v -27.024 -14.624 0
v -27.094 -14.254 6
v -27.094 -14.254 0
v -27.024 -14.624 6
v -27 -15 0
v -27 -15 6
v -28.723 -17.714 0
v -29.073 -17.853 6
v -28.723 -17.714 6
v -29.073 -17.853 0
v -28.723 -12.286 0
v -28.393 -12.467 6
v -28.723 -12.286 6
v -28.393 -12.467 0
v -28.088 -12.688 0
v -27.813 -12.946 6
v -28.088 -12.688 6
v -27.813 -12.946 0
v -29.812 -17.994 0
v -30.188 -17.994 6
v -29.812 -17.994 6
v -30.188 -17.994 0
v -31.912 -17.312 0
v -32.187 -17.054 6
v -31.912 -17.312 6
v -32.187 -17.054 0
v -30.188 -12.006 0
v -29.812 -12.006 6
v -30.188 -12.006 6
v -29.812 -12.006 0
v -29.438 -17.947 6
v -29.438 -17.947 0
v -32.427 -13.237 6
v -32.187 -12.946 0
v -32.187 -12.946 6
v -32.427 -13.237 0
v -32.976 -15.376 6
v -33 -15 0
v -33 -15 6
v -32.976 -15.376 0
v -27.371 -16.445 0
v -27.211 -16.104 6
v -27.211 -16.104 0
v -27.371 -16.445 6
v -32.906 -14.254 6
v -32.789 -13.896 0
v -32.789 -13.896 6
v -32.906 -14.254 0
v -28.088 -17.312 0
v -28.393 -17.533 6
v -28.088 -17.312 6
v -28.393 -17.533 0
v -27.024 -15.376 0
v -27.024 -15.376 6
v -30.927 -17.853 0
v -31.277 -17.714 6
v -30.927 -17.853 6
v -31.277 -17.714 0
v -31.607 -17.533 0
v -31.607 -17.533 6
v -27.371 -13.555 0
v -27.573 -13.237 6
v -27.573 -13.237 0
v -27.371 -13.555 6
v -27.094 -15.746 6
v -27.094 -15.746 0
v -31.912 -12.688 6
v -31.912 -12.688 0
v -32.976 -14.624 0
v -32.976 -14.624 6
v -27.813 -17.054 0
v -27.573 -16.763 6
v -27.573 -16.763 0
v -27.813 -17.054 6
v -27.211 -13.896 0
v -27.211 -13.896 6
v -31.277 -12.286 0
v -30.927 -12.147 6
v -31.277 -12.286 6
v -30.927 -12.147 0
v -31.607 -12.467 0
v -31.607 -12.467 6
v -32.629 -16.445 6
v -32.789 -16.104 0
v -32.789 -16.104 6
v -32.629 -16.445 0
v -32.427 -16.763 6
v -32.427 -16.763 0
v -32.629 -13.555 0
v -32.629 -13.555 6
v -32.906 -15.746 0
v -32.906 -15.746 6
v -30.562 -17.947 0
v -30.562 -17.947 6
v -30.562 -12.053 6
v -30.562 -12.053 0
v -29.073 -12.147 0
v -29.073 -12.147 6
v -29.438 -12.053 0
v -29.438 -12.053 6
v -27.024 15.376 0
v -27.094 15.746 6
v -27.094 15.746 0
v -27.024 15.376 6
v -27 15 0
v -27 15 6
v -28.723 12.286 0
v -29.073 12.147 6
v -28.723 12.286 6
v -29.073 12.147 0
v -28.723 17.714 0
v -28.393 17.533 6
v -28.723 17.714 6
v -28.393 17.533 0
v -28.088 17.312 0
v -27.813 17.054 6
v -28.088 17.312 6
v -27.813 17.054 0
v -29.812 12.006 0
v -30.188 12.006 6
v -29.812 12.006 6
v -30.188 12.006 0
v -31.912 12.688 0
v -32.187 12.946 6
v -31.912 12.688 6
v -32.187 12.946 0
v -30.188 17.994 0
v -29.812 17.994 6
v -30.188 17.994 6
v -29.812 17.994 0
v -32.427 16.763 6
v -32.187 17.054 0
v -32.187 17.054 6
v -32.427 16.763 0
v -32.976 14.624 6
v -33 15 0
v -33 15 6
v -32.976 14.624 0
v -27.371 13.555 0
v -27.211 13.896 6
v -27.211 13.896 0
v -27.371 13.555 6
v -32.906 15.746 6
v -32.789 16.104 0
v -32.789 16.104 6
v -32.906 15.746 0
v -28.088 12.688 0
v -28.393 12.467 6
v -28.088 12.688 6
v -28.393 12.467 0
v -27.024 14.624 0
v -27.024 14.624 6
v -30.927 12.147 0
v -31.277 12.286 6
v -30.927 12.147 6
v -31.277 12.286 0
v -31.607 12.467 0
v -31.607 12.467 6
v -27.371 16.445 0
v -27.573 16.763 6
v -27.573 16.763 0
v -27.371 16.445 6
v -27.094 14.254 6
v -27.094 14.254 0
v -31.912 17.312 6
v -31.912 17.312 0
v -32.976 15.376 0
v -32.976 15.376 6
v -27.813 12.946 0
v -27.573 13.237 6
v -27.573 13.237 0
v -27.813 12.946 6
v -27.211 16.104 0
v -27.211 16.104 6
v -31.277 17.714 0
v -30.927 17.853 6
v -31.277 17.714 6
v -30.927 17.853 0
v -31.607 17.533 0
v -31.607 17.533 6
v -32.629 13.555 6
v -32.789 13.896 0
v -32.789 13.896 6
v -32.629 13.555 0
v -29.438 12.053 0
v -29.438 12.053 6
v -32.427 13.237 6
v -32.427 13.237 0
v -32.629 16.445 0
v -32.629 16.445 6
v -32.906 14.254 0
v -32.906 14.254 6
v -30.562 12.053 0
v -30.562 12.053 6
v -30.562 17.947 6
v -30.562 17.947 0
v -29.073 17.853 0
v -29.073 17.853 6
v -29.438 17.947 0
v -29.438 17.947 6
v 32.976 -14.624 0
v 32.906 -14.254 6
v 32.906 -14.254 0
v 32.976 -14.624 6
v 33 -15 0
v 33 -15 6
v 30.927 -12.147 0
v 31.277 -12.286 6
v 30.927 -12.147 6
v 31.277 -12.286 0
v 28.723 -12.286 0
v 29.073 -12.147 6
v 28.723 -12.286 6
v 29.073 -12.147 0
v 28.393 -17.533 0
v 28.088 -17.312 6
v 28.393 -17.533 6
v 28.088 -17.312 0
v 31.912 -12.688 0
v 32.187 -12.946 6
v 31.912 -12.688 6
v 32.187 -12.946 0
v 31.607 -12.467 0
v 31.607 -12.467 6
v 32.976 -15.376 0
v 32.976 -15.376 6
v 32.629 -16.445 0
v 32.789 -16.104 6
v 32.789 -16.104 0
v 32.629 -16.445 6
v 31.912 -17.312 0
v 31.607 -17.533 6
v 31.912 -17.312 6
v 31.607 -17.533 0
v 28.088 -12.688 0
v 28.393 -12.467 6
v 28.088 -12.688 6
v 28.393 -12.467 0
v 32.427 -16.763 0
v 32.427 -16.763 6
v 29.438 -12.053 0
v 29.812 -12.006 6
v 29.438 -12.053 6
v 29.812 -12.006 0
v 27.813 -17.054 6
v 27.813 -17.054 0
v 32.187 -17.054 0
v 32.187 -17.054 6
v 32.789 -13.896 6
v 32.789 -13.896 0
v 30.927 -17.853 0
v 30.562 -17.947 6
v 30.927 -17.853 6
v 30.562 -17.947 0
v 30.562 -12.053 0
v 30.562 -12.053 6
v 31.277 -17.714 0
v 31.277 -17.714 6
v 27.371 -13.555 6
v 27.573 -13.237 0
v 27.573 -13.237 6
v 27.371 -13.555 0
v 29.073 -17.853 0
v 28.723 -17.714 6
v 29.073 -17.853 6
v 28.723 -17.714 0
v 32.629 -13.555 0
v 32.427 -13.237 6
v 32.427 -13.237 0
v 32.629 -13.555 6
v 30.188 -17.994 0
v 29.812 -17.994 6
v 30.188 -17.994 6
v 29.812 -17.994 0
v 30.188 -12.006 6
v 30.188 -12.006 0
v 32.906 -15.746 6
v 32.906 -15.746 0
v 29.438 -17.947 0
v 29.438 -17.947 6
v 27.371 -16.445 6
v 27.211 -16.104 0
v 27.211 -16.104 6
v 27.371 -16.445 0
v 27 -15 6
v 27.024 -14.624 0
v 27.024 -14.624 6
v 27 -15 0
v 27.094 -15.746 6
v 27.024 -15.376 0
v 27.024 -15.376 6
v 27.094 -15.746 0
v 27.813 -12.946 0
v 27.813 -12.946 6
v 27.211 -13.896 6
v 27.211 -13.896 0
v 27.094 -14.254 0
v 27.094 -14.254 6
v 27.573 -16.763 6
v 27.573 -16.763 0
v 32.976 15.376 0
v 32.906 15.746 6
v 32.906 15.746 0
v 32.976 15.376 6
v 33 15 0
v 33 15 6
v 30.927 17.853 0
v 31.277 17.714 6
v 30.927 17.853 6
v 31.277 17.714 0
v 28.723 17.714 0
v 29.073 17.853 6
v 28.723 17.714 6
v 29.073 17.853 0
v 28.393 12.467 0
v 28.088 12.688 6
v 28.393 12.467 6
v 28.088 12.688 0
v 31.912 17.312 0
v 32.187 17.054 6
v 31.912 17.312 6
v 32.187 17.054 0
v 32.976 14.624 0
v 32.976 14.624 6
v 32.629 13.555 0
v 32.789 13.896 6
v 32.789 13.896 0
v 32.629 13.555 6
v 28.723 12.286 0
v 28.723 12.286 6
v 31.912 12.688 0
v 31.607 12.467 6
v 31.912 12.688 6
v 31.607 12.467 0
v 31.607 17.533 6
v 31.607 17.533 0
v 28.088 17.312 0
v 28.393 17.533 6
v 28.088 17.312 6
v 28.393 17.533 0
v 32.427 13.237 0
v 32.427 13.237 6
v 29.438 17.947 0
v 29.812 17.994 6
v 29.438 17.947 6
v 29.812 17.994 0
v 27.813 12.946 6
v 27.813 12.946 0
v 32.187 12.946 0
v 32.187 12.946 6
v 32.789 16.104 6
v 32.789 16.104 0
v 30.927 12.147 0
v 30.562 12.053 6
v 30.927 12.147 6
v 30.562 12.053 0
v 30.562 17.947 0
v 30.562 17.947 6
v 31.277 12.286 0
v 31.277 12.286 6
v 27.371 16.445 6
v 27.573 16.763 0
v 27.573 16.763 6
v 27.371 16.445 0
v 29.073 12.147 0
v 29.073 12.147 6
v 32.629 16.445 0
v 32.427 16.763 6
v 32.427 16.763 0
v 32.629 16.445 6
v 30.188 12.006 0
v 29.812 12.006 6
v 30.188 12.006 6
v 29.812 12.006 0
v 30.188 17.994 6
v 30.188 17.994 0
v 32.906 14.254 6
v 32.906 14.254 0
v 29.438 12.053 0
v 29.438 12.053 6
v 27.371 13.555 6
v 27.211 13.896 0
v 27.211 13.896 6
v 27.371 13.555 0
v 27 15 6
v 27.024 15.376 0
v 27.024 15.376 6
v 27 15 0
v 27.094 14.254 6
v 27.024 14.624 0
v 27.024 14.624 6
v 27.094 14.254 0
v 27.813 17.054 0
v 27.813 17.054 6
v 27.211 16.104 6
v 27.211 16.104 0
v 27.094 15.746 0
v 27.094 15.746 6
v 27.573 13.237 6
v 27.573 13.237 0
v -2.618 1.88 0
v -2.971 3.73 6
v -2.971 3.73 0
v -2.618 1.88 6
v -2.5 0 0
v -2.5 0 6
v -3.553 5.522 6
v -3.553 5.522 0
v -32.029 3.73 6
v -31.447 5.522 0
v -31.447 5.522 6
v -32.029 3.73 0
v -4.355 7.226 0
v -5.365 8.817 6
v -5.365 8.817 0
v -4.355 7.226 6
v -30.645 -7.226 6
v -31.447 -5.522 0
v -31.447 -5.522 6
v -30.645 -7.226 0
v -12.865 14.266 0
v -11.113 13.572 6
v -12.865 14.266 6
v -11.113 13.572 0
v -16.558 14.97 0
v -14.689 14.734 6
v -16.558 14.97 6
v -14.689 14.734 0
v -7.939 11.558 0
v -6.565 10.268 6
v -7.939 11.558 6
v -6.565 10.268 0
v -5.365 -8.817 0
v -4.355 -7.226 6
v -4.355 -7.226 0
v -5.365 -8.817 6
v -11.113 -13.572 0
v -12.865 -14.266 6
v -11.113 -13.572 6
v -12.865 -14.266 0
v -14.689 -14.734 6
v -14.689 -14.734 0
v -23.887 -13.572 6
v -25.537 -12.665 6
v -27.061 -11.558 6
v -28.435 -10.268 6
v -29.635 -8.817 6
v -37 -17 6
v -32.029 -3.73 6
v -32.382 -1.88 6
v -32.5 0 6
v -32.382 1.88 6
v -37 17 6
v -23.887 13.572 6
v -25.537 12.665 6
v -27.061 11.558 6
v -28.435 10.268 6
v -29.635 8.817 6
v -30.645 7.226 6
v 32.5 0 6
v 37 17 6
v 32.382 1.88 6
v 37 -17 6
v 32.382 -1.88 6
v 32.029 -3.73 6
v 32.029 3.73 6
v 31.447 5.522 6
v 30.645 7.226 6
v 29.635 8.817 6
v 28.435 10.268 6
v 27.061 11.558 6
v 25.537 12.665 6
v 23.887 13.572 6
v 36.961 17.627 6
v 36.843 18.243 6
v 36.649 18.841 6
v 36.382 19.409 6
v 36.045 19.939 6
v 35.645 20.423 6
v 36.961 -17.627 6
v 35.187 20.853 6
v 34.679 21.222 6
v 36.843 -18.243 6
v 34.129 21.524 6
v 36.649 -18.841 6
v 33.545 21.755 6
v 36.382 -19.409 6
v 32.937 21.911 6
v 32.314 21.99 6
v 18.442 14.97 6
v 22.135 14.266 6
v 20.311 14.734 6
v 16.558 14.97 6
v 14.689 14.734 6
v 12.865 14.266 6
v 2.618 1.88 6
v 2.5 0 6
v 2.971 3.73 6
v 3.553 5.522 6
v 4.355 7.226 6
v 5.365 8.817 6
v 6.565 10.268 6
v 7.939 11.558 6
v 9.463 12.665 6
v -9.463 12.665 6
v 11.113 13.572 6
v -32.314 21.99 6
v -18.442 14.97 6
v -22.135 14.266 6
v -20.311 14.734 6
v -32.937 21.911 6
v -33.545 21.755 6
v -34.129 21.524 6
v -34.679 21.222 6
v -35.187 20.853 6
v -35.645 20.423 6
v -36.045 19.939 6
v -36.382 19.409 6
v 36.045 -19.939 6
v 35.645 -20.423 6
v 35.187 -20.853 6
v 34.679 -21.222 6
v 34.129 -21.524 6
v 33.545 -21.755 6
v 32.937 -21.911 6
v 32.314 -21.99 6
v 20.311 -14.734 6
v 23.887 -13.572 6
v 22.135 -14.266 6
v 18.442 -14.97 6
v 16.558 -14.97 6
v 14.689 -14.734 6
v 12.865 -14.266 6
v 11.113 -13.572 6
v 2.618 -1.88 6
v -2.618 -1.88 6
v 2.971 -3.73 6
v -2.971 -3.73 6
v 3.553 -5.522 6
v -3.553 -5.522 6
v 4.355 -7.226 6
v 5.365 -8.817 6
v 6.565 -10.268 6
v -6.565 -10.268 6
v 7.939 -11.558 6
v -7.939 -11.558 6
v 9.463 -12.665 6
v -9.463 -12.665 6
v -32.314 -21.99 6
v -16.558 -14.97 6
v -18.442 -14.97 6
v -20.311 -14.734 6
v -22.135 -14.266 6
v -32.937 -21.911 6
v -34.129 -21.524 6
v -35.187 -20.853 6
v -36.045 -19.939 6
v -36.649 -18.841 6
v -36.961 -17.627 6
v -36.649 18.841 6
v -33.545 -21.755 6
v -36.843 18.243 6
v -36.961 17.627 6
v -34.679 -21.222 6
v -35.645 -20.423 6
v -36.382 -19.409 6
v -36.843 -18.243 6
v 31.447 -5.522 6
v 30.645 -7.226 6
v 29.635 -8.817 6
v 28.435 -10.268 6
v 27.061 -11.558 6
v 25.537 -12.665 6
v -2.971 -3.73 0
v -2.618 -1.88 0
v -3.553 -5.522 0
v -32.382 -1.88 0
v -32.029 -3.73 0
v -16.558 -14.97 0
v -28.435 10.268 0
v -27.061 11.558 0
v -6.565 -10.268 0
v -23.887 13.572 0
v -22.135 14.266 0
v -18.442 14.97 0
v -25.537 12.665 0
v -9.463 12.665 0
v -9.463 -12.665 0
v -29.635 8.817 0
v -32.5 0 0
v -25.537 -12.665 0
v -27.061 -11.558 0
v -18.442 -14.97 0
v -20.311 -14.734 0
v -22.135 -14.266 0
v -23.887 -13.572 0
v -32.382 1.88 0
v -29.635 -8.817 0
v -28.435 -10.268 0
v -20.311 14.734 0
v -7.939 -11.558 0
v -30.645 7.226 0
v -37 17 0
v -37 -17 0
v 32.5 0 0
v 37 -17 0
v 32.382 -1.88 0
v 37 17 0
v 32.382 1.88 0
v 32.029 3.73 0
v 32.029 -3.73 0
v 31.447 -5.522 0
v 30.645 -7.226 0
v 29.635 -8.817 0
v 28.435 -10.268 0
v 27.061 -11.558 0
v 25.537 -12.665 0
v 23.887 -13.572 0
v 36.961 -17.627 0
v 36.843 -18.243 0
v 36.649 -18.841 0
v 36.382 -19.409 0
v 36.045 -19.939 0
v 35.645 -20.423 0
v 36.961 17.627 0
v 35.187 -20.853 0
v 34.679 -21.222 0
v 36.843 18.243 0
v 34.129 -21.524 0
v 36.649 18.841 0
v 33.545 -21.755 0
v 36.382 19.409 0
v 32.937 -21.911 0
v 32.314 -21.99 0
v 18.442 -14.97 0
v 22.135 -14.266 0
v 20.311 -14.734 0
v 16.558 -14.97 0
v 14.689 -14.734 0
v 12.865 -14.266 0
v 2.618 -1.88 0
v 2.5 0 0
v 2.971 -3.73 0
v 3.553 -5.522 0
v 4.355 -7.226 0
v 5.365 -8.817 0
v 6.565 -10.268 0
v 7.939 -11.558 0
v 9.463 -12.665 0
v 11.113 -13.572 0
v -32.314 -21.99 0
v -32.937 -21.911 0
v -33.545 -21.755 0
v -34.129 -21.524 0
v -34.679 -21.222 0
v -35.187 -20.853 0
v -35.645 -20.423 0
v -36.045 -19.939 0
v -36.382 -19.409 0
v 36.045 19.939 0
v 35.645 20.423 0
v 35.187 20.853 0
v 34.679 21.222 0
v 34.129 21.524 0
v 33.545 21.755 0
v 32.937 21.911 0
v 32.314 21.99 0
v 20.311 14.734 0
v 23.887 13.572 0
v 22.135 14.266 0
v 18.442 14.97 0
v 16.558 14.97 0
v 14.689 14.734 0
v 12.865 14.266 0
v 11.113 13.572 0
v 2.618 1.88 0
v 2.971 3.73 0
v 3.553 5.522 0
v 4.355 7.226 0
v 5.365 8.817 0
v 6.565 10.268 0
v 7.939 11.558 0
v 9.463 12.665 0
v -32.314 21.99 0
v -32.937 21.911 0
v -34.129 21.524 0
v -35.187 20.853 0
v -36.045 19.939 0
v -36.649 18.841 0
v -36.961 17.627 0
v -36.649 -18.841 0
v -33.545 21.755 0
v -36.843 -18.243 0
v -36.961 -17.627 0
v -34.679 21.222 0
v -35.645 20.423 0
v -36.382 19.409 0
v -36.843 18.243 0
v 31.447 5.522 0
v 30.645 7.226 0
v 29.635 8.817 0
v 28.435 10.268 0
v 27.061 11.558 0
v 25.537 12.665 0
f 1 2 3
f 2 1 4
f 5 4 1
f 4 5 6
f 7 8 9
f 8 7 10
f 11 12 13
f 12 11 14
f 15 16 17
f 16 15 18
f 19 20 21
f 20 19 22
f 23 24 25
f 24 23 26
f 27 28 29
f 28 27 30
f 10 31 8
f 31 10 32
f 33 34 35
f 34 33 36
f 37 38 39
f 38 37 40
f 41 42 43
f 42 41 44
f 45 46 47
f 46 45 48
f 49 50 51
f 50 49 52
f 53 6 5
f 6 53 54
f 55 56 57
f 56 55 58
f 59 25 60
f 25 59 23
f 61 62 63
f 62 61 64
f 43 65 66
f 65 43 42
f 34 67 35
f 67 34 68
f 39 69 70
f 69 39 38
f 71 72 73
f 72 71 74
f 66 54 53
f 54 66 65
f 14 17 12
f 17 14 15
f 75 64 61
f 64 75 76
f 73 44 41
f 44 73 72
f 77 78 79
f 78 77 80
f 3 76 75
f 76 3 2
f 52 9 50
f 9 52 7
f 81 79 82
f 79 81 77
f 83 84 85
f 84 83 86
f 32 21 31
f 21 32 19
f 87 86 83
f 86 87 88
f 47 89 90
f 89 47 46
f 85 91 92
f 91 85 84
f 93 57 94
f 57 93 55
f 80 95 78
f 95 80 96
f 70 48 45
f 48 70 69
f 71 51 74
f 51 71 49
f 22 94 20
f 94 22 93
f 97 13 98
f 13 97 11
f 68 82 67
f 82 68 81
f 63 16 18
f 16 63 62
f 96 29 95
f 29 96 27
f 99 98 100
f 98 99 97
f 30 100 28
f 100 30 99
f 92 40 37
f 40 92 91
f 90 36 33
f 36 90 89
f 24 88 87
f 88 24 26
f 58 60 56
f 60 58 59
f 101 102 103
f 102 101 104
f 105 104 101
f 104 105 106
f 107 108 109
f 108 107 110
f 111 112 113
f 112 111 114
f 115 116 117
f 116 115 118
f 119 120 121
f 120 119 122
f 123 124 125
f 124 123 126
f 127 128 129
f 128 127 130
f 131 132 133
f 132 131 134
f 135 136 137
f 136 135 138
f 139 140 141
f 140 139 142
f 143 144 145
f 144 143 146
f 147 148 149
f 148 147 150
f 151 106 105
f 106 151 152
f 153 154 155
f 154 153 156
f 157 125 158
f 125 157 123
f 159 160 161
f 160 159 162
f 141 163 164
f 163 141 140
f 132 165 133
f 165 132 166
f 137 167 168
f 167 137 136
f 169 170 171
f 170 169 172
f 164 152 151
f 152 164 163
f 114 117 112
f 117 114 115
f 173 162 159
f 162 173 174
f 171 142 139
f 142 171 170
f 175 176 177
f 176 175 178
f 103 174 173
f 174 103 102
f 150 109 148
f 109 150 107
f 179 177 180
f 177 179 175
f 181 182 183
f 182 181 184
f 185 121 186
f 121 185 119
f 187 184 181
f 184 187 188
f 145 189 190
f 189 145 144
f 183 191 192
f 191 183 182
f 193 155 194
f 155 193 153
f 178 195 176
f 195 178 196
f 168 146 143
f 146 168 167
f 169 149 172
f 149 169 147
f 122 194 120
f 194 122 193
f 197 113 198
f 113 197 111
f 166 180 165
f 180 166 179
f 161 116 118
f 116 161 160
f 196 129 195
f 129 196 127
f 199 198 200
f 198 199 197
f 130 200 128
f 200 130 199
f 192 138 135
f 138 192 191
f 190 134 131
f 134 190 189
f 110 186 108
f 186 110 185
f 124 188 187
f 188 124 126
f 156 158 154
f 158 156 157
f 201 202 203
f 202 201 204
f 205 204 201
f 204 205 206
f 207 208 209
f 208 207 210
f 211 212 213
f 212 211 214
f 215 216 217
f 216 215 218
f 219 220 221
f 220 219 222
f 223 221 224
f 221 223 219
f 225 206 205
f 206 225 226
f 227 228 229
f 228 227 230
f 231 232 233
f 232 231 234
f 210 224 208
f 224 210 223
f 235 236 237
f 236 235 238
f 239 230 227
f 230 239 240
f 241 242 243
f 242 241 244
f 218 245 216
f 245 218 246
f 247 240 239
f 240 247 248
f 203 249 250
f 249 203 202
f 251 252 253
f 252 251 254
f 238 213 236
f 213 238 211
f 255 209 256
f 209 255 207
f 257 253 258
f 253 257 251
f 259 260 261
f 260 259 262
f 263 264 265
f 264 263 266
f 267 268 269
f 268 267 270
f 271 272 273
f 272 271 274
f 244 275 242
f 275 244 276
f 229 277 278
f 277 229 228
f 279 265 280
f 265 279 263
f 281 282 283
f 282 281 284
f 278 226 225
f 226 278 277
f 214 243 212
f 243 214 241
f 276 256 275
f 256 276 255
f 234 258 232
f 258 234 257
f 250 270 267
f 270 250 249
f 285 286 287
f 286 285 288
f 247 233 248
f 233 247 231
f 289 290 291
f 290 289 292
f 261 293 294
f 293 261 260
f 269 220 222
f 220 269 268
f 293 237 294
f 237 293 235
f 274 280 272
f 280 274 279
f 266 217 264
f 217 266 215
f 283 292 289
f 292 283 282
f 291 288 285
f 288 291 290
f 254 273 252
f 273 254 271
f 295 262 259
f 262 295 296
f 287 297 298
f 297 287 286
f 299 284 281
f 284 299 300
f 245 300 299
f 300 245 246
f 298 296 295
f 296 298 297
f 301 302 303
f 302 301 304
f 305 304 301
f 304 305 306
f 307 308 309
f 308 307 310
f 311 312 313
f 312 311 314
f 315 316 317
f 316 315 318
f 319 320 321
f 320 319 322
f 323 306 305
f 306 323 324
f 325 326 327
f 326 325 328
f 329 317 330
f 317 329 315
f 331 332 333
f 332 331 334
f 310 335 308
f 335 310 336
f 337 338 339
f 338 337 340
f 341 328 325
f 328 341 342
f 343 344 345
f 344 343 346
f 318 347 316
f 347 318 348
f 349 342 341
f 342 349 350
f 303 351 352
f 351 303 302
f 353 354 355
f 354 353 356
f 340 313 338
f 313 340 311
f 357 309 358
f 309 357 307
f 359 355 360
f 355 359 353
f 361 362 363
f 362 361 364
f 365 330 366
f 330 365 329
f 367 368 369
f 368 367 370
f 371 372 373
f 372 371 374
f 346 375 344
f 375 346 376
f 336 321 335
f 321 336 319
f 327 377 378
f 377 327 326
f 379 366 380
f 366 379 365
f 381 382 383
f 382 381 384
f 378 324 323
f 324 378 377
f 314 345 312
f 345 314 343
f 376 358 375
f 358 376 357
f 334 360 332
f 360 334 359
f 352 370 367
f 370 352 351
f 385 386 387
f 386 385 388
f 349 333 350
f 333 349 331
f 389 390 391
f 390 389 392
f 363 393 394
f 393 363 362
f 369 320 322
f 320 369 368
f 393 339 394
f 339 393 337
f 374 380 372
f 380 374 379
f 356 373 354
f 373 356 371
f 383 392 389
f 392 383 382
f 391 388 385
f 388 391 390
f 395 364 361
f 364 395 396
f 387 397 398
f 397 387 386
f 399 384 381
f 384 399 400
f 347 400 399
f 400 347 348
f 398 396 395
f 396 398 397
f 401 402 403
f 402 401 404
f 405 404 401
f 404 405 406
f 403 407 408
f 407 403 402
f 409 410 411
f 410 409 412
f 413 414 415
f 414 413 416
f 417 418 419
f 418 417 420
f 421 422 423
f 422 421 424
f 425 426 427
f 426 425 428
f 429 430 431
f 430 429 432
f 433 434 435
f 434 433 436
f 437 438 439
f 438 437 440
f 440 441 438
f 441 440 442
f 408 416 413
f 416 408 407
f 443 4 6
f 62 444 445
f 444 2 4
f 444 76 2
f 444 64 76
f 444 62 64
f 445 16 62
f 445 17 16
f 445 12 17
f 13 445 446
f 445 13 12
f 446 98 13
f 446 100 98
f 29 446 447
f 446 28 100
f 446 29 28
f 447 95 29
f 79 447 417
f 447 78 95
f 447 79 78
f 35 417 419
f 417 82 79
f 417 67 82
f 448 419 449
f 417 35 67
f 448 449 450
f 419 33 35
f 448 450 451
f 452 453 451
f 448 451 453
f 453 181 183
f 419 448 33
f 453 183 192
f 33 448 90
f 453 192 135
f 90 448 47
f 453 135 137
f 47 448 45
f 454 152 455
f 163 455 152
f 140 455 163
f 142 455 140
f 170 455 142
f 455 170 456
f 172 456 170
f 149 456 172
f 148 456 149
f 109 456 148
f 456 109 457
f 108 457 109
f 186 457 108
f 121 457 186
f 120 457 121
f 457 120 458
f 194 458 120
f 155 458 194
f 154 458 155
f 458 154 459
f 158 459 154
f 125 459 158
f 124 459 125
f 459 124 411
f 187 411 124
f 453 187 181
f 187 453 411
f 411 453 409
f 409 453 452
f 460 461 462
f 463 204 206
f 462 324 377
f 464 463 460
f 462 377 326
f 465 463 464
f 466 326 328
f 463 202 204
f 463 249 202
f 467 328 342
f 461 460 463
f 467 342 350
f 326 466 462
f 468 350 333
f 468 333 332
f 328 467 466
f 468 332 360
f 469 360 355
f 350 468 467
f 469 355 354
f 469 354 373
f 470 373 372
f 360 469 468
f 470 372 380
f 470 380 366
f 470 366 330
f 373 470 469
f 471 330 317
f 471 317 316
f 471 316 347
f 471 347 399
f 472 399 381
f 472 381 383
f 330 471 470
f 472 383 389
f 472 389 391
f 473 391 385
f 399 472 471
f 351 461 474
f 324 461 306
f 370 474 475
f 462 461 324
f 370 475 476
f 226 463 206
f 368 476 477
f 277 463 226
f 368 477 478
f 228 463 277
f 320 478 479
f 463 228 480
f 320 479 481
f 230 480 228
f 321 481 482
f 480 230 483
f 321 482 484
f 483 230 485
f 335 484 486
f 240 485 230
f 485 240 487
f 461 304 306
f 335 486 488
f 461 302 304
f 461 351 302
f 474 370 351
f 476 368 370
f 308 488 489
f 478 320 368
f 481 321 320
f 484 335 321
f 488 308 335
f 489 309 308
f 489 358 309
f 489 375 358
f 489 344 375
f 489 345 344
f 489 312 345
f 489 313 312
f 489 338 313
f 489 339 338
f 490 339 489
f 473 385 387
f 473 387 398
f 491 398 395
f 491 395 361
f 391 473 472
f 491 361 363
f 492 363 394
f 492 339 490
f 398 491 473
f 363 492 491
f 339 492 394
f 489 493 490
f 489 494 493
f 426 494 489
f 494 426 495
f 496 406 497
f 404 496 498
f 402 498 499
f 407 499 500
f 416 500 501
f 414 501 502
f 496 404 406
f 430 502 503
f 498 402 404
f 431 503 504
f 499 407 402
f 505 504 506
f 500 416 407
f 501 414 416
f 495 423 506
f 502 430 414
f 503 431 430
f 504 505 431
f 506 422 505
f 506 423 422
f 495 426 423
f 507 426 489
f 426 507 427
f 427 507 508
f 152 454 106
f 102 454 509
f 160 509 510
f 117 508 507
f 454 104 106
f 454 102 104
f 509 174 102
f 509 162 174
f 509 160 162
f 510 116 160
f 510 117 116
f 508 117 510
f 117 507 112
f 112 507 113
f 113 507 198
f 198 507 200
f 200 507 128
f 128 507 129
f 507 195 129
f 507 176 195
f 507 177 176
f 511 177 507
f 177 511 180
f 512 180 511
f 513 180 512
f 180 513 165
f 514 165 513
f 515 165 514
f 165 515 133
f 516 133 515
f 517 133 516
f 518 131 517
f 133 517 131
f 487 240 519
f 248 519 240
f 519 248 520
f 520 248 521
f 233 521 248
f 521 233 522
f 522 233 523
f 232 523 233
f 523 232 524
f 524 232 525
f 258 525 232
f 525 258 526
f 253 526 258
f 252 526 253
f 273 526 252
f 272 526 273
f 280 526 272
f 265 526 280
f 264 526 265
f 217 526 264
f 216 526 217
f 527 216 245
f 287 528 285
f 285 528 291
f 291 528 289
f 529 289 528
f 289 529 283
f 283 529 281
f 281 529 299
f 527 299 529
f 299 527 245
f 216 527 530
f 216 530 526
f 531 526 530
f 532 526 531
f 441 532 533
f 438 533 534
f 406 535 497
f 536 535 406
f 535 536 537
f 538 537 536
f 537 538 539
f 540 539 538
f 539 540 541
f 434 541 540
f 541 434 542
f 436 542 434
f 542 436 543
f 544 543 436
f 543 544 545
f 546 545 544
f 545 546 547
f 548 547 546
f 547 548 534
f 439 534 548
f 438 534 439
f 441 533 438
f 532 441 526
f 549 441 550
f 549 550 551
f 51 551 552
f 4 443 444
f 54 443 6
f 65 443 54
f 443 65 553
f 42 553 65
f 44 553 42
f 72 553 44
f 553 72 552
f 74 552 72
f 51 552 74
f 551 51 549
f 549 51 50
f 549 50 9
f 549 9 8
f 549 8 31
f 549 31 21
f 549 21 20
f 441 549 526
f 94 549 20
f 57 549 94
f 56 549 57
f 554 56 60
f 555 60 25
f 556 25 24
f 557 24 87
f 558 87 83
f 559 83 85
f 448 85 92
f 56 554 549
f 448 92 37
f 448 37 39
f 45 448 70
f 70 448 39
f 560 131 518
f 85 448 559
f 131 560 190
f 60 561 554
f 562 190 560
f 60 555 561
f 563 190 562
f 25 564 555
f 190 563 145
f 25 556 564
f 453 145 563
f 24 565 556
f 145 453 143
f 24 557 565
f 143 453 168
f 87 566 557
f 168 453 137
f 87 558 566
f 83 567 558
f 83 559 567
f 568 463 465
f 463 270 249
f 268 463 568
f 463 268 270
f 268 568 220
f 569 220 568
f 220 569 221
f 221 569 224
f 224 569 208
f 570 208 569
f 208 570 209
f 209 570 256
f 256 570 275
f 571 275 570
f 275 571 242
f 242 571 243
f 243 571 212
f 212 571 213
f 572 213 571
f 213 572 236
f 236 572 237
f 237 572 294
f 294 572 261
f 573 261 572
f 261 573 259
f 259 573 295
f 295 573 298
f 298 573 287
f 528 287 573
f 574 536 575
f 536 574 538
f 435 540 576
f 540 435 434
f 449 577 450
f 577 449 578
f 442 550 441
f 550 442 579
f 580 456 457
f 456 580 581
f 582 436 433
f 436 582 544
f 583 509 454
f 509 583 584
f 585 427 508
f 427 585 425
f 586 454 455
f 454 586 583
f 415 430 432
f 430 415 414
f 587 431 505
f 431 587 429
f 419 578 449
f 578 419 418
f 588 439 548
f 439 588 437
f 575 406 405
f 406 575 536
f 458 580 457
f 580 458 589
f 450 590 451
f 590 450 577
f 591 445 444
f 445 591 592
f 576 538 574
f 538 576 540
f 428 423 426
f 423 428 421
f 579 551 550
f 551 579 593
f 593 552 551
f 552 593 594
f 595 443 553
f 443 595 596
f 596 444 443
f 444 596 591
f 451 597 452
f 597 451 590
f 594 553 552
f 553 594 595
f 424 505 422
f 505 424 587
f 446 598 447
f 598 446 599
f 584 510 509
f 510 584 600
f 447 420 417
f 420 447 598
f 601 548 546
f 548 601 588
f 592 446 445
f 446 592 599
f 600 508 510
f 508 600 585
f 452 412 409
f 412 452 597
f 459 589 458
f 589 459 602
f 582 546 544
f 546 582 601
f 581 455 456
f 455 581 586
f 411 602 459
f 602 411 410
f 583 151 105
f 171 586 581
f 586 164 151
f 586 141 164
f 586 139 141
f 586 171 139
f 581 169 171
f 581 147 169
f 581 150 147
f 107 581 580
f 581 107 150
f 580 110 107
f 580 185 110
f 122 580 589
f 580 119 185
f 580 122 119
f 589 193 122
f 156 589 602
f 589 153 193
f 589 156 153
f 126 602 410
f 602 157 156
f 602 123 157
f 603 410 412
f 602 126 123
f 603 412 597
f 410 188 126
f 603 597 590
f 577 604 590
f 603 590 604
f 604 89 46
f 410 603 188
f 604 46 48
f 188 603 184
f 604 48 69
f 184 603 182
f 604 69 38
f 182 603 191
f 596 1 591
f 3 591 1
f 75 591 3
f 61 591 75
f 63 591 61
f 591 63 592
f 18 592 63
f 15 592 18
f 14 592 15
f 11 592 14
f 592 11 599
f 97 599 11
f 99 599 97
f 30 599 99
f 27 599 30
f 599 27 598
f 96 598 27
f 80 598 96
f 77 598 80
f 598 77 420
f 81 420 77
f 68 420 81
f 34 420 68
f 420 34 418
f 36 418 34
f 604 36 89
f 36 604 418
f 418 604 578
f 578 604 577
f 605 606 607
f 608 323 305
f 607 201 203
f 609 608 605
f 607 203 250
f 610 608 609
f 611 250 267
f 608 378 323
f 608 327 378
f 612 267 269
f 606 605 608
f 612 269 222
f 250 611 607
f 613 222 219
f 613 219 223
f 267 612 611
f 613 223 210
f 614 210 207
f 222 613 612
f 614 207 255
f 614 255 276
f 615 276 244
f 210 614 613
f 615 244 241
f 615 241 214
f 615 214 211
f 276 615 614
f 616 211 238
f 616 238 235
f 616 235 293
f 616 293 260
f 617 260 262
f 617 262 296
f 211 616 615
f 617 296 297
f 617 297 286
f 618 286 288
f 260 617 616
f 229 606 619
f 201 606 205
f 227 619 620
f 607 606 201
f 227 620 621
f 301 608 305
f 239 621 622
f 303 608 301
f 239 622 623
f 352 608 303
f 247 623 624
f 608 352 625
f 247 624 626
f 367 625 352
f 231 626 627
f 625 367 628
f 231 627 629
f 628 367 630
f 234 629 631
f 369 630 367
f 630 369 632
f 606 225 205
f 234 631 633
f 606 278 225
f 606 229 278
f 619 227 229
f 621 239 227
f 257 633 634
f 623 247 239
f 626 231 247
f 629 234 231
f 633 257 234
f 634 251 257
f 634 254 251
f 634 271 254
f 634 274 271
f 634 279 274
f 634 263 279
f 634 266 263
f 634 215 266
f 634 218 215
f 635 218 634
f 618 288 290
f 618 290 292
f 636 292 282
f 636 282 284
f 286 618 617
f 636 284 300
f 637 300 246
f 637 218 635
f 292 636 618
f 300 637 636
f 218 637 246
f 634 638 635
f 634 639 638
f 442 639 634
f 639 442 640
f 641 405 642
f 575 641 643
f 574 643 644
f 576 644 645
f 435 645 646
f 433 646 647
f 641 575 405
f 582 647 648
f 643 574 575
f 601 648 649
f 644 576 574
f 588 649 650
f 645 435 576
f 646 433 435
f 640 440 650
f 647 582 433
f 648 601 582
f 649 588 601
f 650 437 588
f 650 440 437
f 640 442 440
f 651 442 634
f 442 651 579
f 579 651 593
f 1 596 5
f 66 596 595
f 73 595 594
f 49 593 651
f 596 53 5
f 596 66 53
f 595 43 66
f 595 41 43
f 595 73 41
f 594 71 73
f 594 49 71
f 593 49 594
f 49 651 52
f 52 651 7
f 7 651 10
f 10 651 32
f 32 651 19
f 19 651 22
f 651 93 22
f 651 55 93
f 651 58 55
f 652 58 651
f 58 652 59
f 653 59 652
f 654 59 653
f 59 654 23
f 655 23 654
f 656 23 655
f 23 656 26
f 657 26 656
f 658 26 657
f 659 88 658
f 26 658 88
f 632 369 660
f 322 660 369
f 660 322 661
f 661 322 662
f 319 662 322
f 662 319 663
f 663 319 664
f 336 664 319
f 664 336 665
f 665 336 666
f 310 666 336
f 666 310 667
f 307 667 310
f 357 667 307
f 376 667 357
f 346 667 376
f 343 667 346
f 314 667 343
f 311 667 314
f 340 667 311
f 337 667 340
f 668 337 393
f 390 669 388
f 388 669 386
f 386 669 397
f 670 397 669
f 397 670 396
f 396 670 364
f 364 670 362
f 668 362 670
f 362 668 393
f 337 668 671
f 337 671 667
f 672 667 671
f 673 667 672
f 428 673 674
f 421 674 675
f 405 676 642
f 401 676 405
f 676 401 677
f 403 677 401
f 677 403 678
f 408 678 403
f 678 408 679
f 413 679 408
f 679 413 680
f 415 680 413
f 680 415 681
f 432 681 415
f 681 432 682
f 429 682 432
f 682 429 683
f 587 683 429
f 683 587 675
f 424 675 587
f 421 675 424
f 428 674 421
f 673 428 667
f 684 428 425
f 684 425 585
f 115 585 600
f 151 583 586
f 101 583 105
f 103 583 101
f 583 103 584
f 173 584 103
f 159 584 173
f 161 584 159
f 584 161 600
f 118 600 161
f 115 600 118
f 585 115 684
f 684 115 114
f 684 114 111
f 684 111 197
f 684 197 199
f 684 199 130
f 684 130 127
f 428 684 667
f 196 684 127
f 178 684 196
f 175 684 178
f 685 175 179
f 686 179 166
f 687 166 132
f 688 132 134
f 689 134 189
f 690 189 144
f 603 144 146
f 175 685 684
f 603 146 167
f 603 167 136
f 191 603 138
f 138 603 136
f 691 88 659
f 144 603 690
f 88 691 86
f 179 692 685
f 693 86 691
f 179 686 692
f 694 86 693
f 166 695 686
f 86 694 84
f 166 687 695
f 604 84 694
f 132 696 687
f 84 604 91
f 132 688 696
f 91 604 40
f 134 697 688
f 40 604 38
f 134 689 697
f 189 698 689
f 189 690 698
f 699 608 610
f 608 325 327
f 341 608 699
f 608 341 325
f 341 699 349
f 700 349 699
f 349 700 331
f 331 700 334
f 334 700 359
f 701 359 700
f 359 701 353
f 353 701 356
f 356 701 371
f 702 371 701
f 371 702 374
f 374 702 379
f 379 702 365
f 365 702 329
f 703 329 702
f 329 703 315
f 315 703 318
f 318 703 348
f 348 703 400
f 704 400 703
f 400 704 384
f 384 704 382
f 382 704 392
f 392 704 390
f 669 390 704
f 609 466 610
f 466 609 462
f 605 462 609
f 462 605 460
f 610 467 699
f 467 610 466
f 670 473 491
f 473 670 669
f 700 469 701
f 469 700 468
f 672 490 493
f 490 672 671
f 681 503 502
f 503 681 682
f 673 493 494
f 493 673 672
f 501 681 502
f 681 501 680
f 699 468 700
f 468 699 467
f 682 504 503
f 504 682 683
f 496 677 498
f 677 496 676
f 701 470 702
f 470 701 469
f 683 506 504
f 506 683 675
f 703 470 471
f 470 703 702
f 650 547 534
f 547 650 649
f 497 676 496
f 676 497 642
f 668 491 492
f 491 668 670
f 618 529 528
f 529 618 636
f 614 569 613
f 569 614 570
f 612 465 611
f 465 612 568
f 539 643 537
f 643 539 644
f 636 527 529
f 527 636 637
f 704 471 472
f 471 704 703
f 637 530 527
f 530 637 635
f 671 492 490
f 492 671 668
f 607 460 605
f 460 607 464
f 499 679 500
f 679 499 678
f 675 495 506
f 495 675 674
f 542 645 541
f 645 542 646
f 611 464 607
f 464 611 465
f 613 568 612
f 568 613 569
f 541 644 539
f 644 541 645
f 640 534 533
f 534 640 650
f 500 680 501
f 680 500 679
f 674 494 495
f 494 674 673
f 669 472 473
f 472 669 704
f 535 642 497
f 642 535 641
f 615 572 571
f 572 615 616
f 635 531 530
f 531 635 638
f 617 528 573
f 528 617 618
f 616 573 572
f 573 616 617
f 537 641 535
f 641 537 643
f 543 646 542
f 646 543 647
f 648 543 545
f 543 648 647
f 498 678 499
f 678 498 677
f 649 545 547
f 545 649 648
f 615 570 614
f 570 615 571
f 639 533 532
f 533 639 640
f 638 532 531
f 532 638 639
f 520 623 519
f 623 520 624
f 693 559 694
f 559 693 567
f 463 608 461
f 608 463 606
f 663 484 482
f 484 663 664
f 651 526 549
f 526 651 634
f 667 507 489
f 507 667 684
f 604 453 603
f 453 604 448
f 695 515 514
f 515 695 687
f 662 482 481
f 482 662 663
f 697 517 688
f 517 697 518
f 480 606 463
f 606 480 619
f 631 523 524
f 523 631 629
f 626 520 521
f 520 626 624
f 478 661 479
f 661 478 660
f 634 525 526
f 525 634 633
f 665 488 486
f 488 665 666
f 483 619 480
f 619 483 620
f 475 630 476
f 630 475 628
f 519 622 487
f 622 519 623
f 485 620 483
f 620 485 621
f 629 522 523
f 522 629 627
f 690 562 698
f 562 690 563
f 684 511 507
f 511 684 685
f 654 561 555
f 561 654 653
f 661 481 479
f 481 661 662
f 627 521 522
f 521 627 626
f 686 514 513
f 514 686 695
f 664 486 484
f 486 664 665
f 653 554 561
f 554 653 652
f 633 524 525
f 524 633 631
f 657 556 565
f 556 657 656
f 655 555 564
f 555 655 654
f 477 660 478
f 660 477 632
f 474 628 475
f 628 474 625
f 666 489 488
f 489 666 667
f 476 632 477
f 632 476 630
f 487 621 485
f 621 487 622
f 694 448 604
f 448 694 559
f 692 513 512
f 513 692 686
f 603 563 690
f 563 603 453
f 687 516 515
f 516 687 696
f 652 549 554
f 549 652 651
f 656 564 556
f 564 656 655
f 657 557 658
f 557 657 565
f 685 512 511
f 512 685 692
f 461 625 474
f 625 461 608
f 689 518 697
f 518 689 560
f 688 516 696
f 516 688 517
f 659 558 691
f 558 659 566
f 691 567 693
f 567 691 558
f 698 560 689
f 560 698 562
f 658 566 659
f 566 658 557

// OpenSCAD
$fn = 50;

difference() {
	union() {
		hull() {
			translate(v = [-32.0, 17.0, 0]) {
				cylinder(h = 6, r = 5);
			}
			translate(v = [32.0, 17.0, 0]) {
				cylinder(h = 6, r = 5);
			}
			translate(v = [-32.0, -17.0, 0]) {
				cylinder(h = 6, r = 5);
			}
			translate(v = [32.0, -17.0, 0]) {
				cylinder(h = 6, r = 5);
			}
		}
	}
	union() {
		translate(v = [-30.0, -15.0, -100.0]) {
			cylinder(h = 200, r = 3.0);
		}
		translate(v = [-30.0, 15.0, -100.0]) {
			cylinder(h = 200, r = 3.0);
		}
		translate(v = [30.0, -15.0, -100.0]) {
			cylinder(h = 200, r = 3.0);
		}
		translate(v = [30.0, 15.0, -100.0]) {
			cylinder(h = 200, r = 3.0);
		}
		translate(v = [-30.0, -15.0, -100.0]) {
			cylinder(h = 200, r = 1.5);
		}
		translate(v = [-30.0, 15.0, -100.0]) {
			cylinder(h = 200, r = 1.5);
		}
		translate(v = [30.0, -15.0, -100.0]) {
			cylinder(h = 200, r = 1.5);
		}
		translate(v = [30.0, 15.0, -100.0]) {
			cylinder(h = 200, r = 1.5);
		}
		translate(v = [-17.5, 0, 0.0]) {
			cylinder(h = 6, r = 15.0);
		}
		translate(v = [17.5, 0, 0.0]) {
			cylinder(h = 6, r = 15.0);
		}
	}
}
